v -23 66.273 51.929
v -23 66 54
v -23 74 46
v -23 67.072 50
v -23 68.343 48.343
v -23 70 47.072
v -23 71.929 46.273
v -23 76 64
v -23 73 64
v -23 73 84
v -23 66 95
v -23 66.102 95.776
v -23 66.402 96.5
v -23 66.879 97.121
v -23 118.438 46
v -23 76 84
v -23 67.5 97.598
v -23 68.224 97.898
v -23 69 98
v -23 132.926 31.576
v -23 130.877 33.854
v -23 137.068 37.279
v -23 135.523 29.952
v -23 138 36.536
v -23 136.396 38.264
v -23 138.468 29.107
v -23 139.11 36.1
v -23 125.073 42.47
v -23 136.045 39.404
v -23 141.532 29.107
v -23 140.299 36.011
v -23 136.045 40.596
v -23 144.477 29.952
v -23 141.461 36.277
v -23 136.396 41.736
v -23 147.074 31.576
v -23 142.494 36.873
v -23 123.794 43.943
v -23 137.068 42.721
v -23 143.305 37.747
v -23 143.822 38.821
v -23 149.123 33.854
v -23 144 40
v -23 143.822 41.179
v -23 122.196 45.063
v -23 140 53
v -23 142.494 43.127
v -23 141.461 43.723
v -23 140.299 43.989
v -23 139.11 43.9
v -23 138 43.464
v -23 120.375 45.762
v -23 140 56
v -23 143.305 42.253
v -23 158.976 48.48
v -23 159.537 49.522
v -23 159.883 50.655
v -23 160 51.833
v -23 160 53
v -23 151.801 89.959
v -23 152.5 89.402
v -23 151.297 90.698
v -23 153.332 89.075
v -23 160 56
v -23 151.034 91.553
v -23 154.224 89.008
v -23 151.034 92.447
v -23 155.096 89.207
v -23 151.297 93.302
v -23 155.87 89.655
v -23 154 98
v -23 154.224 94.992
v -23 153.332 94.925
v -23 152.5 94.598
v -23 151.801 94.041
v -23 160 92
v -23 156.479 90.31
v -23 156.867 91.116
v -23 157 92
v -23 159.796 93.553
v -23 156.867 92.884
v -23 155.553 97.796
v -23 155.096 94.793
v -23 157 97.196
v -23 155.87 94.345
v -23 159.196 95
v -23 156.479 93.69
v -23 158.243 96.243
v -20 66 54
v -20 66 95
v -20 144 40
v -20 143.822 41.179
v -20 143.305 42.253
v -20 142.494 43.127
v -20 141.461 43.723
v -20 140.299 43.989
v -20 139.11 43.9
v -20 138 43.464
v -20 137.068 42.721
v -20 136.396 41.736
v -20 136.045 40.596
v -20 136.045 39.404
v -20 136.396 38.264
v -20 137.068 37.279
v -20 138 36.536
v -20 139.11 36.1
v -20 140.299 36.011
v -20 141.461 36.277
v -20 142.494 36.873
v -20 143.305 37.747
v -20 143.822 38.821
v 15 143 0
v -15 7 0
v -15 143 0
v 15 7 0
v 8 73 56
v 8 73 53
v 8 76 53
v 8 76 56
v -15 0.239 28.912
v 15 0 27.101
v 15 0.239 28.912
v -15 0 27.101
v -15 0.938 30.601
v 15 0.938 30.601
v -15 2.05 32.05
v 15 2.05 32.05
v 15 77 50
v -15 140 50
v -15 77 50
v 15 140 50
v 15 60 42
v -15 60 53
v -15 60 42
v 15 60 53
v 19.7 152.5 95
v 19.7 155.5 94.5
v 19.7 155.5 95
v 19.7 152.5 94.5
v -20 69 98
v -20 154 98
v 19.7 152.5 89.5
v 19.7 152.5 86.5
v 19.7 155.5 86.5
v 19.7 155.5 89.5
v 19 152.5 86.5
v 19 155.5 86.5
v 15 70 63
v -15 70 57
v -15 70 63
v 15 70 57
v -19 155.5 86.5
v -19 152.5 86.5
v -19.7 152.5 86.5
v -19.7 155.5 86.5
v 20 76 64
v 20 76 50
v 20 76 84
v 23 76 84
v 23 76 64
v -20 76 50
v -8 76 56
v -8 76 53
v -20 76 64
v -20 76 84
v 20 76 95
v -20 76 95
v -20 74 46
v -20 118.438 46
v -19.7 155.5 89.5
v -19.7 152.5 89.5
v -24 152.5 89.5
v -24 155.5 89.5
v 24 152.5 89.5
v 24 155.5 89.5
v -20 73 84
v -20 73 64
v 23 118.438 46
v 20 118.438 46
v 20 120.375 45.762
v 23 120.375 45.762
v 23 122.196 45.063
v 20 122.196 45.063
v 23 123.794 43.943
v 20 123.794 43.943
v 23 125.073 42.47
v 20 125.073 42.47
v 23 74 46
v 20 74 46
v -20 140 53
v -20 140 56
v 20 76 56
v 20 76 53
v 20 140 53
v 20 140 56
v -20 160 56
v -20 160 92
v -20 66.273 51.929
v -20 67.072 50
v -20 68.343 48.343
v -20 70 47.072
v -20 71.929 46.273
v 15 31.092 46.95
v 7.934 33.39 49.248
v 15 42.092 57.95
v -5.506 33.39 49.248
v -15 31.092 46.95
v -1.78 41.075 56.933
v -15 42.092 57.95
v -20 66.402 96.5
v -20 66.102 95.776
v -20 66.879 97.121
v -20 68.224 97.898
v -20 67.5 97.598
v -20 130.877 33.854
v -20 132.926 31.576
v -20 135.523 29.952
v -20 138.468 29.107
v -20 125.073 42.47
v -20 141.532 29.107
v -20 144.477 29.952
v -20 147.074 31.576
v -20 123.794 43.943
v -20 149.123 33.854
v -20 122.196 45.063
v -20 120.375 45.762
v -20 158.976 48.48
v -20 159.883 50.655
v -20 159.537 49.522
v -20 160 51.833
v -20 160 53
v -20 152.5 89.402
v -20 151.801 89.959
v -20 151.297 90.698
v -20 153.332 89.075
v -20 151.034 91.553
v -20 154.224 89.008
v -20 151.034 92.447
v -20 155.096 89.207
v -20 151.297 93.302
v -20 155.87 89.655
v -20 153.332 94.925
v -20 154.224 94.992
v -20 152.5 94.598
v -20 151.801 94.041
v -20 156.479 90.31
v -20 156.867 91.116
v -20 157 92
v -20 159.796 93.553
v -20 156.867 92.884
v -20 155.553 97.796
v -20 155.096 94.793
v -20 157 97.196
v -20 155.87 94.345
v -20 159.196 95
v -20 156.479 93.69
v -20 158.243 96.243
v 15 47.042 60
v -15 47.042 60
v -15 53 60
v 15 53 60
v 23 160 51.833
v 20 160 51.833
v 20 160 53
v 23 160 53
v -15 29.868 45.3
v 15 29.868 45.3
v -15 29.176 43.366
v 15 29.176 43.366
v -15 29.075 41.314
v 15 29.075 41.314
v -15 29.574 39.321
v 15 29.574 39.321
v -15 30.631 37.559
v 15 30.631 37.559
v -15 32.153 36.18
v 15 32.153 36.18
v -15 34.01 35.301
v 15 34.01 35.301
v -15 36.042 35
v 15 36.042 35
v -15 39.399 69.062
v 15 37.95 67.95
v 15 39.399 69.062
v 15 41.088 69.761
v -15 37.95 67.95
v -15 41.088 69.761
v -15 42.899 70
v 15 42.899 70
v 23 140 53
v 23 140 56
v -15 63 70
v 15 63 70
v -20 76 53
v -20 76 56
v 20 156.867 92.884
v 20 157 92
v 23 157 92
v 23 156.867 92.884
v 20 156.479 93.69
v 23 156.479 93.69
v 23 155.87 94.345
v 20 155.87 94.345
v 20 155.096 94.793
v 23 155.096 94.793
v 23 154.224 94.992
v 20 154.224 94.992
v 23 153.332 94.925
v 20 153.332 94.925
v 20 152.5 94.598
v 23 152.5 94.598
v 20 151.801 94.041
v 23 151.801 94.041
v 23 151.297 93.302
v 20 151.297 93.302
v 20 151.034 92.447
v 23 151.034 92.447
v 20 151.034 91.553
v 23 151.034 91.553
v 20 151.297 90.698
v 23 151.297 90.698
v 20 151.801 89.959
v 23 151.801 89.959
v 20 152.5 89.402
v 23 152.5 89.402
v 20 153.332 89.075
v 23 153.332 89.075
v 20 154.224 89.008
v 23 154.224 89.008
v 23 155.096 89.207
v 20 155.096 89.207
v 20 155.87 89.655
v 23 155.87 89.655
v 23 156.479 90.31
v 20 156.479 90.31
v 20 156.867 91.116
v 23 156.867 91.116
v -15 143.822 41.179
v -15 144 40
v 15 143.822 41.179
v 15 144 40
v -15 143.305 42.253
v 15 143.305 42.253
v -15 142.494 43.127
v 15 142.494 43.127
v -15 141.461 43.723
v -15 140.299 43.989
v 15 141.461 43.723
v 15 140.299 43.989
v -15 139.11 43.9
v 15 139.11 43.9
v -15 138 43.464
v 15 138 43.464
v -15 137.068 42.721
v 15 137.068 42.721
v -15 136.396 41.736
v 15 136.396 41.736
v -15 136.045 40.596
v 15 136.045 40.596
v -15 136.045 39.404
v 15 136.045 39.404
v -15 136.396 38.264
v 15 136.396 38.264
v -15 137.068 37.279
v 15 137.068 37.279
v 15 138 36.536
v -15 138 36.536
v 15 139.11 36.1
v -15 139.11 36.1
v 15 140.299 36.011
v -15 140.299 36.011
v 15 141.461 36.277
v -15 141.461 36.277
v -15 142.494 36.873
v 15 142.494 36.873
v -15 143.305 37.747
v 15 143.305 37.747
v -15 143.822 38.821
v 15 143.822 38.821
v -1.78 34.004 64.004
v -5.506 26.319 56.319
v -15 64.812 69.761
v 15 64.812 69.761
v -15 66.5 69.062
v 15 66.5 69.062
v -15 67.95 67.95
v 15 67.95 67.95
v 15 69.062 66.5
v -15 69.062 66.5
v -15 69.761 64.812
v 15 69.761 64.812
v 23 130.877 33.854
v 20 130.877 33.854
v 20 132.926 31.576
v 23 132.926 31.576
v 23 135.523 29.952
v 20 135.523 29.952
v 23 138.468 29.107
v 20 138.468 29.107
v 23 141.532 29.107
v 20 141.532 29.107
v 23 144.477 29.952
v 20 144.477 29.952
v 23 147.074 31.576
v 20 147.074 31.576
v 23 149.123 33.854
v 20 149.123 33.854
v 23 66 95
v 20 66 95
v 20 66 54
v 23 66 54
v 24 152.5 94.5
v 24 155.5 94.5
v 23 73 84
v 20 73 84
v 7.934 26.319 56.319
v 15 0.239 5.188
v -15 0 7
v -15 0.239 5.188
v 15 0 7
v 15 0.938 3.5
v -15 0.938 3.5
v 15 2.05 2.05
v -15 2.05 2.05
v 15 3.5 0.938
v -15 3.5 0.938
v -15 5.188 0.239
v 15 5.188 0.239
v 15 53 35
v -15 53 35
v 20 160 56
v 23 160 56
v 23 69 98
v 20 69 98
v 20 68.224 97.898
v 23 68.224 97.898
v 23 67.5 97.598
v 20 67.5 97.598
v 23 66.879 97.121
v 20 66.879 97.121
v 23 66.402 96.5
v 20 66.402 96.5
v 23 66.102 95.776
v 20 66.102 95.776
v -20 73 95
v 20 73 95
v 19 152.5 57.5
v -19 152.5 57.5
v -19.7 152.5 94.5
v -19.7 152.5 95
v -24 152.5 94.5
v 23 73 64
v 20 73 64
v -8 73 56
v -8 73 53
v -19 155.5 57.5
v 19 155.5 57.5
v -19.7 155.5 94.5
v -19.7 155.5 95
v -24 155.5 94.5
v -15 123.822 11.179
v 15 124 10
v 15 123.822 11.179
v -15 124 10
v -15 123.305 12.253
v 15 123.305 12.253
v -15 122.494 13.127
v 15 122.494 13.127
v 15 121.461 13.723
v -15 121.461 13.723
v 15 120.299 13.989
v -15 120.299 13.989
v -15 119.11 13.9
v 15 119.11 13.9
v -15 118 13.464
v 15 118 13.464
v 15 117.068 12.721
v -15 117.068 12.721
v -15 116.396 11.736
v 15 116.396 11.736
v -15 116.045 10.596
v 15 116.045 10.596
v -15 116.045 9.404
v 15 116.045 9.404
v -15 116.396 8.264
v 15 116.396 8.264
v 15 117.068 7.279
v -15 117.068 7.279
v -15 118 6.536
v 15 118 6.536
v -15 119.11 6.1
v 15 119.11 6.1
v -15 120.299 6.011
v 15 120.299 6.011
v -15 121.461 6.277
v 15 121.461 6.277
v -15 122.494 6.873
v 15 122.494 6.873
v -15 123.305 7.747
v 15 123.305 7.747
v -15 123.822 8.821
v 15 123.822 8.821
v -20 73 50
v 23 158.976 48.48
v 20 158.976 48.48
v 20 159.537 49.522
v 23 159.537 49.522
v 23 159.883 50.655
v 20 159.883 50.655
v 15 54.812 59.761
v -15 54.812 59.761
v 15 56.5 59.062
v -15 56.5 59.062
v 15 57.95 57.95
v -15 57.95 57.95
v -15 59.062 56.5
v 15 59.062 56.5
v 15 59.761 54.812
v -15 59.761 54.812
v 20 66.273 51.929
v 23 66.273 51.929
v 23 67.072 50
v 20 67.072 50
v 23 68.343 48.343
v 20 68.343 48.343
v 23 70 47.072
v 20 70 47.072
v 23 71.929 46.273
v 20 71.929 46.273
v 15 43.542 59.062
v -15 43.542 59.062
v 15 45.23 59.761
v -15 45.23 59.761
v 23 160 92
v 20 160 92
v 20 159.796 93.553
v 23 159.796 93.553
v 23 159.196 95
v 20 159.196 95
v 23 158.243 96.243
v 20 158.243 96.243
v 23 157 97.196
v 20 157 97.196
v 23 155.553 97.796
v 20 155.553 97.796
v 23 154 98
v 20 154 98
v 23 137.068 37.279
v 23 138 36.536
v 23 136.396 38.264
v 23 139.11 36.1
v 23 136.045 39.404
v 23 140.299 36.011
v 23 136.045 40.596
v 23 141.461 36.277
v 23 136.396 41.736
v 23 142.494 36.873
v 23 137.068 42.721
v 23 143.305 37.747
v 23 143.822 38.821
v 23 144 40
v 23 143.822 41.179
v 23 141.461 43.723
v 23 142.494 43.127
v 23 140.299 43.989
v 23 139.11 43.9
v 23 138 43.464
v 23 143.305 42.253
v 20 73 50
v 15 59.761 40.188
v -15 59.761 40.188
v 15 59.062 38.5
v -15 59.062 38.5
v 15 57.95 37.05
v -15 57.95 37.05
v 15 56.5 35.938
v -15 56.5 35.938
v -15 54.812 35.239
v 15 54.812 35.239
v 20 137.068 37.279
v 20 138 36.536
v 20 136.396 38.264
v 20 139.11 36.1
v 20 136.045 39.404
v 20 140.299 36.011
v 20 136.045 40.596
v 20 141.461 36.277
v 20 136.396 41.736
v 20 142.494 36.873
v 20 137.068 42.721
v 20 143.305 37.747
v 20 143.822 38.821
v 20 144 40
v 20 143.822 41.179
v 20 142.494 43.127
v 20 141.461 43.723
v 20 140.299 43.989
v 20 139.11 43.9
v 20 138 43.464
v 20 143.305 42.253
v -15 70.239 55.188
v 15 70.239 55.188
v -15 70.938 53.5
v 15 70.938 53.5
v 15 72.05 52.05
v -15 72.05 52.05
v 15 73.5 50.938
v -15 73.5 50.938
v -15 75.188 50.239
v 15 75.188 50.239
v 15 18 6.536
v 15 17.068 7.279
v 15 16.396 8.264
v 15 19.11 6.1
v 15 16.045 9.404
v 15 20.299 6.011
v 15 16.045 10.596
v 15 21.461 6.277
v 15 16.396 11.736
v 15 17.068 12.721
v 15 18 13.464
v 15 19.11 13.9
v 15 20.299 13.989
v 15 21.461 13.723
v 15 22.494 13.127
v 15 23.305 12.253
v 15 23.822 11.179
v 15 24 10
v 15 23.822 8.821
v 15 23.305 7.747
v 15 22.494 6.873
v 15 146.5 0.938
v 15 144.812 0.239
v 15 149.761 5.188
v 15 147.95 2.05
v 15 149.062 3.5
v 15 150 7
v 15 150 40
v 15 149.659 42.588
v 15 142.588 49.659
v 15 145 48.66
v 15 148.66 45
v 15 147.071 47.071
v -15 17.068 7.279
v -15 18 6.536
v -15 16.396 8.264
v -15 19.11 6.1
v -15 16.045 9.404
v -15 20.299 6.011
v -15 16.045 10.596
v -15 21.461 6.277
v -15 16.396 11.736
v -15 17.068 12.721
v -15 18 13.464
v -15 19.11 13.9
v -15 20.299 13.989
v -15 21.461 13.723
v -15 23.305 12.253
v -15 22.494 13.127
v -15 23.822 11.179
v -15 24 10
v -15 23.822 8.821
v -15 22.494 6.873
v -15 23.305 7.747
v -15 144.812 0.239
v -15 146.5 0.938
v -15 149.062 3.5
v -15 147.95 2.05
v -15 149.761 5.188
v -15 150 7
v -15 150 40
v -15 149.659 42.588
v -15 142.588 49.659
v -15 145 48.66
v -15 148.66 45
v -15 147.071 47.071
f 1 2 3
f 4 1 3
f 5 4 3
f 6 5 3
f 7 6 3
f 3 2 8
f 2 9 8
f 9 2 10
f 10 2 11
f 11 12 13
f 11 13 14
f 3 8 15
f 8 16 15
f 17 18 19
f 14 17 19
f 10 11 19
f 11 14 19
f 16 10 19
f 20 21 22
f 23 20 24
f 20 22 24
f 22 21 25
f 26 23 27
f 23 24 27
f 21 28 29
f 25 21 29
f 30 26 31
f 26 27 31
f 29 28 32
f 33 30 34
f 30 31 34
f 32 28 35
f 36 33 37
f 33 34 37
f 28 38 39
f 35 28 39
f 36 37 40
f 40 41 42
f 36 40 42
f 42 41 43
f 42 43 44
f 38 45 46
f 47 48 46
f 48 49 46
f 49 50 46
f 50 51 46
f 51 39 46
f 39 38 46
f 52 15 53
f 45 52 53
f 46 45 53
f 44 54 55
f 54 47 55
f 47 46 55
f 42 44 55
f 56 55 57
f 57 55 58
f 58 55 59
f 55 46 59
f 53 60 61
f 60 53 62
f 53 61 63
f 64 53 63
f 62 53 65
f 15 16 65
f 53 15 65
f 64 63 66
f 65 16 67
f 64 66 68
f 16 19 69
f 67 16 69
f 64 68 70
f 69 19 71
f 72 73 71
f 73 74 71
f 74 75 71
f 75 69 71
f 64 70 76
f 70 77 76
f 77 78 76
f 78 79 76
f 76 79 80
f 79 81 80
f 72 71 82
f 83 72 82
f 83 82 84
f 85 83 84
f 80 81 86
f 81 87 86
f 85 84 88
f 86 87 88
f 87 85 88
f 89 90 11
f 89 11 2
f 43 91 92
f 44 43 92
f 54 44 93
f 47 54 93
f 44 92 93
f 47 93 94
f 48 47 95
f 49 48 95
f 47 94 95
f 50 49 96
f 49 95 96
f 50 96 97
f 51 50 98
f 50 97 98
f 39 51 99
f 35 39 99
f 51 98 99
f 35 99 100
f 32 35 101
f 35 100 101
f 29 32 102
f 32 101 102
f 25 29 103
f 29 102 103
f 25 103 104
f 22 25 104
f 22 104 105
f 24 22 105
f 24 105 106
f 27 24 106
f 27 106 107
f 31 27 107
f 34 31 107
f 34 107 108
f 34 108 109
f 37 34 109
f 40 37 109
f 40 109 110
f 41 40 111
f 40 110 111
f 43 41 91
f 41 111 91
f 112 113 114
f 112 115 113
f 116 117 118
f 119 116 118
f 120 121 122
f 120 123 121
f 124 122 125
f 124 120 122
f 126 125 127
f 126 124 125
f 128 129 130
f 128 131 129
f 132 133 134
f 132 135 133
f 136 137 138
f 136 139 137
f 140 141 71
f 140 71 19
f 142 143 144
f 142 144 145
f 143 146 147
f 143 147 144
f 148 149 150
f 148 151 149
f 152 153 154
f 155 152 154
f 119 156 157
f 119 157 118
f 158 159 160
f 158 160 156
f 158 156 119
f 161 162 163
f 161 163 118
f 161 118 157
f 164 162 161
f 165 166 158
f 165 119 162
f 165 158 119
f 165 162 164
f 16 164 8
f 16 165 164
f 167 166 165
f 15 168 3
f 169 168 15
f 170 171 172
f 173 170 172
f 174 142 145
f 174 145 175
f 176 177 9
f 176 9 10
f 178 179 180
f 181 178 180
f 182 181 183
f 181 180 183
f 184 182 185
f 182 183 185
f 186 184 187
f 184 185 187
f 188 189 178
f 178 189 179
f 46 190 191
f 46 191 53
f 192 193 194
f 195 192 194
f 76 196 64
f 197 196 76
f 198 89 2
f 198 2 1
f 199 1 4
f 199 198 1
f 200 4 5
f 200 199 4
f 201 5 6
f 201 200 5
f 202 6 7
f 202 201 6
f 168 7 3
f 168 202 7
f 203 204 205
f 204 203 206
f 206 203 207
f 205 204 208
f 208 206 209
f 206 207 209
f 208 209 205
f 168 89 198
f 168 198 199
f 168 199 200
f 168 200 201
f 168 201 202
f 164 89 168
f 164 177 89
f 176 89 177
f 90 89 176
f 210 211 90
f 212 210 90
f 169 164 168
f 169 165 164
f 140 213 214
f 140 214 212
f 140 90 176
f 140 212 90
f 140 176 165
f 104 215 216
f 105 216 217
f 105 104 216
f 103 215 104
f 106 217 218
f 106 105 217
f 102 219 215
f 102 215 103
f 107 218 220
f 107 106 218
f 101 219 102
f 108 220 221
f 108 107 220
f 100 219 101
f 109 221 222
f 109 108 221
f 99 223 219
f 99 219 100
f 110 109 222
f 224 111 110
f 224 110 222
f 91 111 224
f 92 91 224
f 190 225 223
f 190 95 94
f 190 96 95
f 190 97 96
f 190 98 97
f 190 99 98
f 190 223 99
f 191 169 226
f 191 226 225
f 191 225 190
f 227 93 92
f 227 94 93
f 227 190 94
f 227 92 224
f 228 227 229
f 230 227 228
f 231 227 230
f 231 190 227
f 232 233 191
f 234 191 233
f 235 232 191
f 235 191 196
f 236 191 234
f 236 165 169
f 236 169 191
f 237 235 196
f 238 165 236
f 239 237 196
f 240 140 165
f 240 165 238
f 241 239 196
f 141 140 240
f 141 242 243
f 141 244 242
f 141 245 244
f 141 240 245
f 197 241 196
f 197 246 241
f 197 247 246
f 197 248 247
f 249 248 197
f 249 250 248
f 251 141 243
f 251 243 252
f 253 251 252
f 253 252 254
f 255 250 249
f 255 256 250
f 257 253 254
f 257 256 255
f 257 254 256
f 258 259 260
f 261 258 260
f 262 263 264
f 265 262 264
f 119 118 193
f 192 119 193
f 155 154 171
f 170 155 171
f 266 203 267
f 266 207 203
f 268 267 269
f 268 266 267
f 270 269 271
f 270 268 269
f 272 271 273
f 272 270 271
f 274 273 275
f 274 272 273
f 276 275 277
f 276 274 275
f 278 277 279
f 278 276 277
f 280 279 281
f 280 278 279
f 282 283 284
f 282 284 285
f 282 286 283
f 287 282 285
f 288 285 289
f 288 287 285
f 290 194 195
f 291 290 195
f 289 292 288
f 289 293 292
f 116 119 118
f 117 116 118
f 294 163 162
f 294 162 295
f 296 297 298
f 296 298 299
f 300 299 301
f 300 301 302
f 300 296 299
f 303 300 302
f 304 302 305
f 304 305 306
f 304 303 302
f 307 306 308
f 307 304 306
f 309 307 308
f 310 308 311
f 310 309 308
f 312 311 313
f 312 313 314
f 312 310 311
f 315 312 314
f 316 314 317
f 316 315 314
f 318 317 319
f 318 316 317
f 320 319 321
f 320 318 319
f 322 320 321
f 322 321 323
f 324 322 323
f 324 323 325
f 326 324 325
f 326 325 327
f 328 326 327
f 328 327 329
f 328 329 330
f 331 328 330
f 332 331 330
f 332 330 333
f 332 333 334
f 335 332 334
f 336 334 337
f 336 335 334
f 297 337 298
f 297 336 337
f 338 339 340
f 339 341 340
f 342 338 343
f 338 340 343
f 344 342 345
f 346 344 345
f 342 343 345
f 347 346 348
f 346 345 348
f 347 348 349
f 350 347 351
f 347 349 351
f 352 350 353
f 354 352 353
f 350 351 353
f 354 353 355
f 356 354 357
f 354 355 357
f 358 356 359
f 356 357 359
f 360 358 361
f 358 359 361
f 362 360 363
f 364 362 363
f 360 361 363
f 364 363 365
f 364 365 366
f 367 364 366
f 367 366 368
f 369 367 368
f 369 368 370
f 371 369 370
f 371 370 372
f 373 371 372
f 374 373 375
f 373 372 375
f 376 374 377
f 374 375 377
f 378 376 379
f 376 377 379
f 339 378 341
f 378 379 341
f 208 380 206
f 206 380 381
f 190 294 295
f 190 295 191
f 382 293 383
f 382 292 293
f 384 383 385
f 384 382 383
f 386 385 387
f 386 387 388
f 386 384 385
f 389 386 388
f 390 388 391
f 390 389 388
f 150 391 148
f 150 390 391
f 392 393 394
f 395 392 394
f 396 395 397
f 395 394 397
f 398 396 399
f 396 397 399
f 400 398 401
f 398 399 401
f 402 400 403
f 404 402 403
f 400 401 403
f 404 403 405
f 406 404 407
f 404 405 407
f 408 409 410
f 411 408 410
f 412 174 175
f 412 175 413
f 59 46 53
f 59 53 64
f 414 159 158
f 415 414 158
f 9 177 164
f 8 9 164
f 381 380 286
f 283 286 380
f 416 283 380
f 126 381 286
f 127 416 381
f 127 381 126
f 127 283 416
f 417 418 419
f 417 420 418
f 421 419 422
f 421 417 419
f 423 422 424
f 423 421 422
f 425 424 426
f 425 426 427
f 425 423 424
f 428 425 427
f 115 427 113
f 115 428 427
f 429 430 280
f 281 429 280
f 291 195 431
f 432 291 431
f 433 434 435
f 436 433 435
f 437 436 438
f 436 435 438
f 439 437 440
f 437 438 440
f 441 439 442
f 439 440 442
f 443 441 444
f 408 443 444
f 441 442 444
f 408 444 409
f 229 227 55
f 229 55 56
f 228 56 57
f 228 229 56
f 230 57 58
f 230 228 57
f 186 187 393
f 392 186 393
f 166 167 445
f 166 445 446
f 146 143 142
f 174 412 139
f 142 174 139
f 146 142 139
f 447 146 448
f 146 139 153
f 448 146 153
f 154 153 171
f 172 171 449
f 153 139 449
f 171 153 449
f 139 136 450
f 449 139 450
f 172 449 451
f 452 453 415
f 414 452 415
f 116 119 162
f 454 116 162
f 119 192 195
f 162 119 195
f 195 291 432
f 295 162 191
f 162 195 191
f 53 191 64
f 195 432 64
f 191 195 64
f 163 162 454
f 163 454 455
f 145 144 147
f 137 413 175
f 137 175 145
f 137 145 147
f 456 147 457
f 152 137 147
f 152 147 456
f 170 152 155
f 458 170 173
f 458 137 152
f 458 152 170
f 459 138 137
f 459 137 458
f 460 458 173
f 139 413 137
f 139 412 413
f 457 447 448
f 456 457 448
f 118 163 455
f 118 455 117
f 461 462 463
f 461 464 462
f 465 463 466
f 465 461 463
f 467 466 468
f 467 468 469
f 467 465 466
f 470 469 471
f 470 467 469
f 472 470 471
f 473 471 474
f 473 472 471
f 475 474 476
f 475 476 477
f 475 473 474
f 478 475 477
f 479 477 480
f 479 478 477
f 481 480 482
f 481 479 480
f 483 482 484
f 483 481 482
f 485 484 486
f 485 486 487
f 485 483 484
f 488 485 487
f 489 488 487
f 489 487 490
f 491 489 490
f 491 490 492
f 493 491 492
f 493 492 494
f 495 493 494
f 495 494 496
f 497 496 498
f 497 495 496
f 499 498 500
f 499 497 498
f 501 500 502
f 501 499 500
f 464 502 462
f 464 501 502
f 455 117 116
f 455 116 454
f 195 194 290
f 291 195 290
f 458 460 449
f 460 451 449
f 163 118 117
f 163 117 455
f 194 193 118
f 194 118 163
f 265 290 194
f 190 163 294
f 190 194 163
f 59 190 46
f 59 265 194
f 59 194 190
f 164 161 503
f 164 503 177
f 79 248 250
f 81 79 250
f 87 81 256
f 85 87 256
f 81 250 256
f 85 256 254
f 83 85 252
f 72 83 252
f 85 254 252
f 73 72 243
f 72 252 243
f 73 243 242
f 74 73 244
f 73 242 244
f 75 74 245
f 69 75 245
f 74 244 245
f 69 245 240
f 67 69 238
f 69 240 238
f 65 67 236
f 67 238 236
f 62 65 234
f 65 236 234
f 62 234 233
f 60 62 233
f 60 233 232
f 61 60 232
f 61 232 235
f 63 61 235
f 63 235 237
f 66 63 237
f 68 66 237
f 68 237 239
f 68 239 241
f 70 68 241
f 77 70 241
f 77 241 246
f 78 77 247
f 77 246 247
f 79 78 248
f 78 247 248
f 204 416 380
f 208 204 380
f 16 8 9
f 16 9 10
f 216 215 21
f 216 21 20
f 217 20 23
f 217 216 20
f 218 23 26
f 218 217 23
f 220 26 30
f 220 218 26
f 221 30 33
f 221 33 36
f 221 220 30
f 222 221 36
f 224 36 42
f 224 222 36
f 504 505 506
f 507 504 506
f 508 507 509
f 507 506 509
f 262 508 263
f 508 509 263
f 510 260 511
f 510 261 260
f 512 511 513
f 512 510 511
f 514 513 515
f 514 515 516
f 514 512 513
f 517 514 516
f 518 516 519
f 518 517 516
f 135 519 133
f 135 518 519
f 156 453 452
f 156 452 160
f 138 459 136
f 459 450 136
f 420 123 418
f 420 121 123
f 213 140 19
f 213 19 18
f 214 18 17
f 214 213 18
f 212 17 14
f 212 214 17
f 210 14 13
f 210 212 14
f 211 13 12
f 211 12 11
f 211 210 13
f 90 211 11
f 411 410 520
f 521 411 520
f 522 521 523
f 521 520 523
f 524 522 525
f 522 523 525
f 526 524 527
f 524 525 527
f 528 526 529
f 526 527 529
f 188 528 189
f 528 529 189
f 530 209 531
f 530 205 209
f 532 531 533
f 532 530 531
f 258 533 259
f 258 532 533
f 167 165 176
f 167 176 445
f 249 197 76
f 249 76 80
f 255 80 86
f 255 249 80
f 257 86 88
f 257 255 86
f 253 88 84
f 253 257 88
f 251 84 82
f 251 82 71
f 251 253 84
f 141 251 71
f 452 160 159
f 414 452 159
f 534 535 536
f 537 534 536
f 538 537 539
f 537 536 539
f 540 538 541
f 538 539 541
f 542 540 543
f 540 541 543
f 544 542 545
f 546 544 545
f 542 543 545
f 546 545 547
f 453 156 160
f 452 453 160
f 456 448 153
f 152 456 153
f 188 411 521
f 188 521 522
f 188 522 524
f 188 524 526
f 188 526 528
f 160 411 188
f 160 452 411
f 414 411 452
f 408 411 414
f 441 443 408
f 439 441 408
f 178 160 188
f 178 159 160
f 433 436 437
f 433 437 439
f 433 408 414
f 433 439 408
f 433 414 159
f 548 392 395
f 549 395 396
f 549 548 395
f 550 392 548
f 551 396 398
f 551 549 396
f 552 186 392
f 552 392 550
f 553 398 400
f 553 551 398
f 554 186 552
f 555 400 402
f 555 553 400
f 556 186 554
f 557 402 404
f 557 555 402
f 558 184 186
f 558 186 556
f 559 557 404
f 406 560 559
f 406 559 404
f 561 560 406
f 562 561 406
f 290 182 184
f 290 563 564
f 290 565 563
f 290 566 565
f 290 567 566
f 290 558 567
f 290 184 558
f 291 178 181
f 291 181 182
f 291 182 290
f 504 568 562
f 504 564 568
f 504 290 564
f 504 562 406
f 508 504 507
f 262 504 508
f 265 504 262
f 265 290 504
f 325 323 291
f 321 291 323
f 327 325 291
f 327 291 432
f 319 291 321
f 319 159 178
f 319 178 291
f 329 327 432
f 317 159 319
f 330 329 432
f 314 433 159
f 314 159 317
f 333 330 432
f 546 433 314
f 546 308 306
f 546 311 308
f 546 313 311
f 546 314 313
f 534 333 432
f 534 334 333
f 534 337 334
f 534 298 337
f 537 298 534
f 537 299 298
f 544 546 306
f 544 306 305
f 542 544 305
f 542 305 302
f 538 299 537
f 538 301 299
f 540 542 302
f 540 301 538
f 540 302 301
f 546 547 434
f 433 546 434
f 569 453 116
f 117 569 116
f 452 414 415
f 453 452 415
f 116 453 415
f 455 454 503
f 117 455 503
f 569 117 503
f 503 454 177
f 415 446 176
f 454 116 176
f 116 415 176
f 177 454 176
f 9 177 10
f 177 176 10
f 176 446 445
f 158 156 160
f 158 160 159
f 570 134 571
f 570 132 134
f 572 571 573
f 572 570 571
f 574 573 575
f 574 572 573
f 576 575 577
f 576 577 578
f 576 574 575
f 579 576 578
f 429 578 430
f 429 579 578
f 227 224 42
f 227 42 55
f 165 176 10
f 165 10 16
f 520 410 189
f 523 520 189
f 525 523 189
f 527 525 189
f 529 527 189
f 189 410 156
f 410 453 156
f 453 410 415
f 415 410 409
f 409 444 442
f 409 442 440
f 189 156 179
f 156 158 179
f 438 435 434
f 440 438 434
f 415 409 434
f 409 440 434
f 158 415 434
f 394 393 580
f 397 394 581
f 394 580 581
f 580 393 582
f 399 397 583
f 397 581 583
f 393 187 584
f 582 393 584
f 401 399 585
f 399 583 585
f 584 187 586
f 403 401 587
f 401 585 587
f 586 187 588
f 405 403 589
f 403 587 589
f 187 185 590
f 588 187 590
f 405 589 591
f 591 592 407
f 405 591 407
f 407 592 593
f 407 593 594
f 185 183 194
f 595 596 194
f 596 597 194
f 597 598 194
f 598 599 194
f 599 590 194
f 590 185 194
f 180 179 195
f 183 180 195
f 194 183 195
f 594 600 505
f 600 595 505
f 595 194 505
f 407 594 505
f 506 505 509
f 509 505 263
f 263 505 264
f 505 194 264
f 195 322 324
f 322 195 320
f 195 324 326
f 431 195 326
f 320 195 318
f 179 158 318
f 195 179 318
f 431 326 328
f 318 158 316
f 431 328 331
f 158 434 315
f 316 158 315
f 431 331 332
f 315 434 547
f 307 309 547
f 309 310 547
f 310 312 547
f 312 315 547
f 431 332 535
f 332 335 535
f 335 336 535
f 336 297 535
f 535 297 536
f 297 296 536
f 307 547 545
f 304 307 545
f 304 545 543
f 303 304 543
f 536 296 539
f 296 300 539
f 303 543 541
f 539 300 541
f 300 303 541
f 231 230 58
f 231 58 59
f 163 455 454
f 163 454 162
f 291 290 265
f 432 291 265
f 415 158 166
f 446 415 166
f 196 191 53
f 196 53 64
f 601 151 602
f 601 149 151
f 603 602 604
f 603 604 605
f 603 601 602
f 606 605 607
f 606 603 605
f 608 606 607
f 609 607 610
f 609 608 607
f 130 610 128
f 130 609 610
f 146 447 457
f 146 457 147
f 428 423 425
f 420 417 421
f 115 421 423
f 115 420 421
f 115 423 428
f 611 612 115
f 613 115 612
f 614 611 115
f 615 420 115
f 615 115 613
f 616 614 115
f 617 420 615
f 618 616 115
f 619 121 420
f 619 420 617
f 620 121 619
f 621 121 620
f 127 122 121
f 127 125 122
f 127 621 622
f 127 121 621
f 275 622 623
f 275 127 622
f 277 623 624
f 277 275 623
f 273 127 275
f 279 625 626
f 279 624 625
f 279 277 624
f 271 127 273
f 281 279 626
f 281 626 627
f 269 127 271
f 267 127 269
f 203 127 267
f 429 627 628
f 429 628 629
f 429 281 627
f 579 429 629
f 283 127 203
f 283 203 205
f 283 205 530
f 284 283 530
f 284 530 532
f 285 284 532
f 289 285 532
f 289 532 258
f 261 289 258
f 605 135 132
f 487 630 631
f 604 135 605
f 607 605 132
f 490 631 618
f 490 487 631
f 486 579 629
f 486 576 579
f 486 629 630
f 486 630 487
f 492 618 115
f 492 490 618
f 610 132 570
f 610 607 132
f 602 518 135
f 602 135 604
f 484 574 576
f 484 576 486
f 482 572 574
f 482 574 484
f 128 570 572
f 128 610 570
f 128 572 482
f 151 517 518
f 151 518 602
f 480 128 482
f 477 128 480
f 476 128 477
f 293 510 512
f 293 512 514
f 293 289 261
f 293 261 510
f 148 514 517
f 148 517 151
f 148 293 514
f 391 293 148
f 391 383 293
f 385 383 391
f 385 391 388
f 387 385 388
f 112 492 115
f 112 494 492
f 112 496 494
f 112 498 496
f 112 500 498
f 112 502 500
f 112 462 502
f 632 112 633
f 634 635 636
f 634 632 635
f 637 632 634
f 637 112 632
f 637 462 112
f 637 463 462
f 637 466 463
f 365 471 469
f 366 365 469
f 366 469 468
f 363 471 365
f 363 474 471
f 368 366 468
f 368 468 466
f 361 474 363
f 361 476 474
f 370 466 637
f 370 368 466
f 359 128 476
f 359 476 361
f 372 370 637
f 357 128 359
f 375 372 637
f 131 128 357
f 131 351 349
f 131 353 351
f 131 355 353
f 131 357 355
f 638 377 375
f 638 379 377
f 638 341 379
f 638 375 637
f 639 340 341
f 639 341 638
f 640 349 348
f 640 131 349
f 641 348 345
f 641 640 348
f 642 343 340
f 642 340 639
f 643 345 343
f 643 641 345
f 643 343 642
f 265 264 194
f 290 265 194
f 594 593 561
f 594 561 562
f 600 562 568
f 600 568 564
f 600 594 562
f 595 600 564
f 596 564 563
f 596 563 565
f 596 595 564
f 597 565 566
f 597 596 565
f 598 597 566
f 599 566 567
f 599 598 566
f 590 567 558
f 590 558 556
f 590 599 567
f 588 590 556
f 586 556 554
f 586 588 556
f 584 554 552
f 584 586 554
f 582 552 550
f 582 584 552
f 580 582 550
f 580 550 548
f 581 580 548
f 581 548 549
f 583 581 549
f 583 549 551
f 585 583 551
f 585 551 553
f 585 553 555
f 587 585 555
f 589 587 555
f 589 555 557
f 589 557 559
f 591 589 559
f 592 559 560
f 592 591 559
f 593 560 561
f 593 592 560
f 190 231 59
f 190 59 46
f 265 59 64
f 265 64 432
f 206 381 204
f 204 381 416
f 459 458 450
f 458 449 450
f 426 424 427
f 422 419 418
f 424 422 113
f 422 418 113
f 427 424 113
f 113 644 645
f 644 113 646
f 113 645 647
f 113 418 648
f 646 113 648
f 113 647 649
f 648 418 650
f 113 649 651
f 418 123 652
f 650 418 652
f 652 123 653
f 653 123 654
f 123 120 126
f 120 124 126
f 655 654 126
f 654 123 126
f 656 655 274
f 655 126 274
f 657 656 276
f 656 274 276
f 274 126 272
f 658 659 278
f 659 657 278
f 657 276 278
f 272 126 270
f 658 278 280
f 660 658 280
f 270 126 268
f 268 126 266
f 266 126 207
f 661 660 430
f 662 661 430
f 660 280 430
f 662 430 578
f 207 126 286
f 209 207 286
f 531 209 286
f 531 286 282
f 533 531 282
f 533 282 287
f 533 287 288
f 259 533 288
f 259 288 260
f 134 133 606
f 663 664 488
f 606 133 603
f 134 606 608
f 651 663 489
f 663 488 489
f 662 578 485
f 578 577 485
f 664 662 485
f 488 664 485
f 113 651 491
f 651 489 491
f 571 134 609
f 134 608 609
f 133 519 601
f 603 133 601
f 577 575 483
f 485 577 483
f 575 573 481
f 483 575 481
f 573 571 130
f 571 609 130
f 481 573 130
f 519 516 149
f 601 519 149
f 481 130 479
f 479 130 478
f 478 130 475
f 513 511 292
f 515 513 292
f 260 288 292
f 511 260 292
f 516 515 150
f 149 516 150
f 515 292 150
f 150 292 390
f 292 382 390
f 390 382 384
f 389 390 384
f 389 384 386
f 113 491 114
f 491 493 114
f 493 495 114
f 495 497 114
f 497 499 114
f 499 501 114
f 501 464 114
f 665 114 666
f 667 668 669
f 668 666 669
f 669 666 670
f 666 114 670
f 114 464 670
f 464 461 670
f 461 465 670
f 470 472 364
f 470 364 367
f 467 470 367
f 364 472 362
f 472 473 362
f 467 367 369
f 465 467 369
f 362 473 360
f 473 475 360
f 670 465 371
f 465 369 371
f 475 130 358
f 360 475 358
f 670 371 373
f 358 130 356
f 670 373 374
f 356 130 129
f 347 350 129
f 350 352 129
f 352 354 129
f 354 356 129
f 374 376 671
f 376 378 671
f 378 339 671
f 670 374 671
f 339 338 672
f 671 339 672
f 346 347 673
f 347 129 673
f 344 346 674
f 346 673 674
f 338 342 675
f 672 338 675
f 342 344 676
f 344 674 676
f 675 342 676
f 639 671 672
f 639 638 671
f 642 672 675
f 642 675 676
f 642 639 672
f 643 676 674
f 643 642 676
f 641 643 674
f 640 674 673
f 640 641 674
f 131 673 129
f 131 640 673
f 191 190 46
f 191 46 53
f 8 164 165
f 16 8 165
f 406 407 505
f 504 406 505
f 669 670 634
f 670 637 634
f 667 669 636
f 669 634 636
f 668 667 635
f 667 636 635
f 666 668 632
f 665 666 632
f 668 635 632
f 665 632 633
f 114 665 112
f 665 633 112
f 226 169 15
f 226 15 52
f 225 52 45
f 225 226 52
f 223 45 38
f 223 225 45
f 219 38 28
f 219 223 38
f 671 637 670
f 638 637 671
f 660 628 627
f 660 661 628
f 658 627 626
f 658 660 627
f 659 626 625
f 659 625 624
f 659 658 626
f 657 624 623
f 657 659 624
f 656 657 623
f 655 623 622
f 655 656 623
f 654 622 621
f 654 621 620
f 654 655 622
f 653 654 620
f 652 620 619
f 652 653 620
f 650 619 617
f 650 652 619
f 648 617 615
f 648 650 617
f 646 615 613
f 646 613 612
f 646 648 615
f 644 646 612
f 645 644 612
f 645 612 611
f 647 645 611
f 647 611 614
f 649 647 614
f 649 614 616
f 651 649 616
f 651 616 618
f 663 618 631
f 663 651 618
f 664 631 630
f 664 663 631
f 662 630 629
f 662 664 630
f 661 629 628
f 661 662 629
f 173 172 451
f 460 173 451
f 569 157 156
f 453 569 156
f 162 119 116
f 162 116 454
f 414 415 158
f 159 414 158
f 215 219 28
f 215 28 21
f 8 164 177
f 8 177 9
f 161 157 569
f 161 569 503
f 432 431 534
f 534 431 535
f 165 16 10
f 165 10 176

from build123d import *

# Parameters (mm, degrees)
F0_R      = 4
F1_DEPTH  = 15
F2_R      = 7
F4_DEPTH  = 10
F5_R      = 10
F6_R      = 4
F7_DEPTH  = 55.49347
F9_R      = 4
F9_W      = 3
F9_H      = 20
F9_R_2    = 3
F10_DEPTH = 3
F13_DEPTH = 3
F16_DEPTH = 3
F20_DEPTH = 1.5


with BuildPart() as f1:
    # F0 (on Right) → F1 (new body, symmetric)
    with BuildSketch(Plane.YZ):
        Polygon((0, 30), (0, 0), (150, 0), (150, 50), (70, 50), (70, 70), (40, 70), align=None)
        with Locations((20, 10)):
            Circle(F0_R, mode=Mode.SUBTRACT)
        with Locations((120, 10)):
            Circle(F0_R, mode=Mode.SUBTRACT)
        Polygon((19.1421356237, 35), (44.1421356237, 60), (60, 60), (60, 35), align=None, mode=Mode.SUBTRACT)
    extrude(amount=F1_DEPTH, both=True)

    # F2
    f2_edges = [f1.edges().sort_by_distance(p)[0] for p in [
        (0, 40, 70),
        (0, 70, 70),
        (0, 0, 30),
        (0, 0, 0),
        (0, 150, 0),
        (0, 60, 35),
        (0, 44.142136, 60),
        (0, 19.142136, 35),
        (0, 60, 60),
        (0, 70, 50),
    ]]
    fillet(f2_edges, radius=F2_R)

    # F3 (on face) → F4 (cut, through all)
    with BuildSketch(Plane(origin=(0, -15, 15), x_dir=(1, 0, 0), z_dir=(0, -0.7071067812, 0.7071067812))):
        Polygon((7.9343309626, 58.4344230592), (-1.7800361384, 69.3023130298), (-5.5058463477, 58.4344230592), align=None)
    extrude(amount=-F4_DEPTH, mode=Mode.SUBTRACT)

    # F5
    f5_edges = [f1.edges().sort_by_distance(p)[0] for p in [
        (0, 150, 50),
    ]]
    fillet(f5_edges, radius=F5_R)

    # F6 (on Right) → F7 (cut, symmetric)
    with BuildSketch(Plane.YZ):
        with Locations((140, 40)):
            Circle(F6_R)
    extrude(amount=F7_DEPTH, both=True, mode=Mode.SUBTRACT)


with BuildPart() as f10:
    # F9 (on offset) → F10 (new body)
    with BuildSketch(Plane.YZ.offset(20)):
        with BuildLine():
            Line((154, 98), (69, 98))
            ThreePointArc((69, 98), (66.8786796564, 97.1213203436), (66, 95))
            Line((66, 95), (66, 54))
            ThreePointArc((66, 54), (68.3431457505, 48.3431457505), (74, 46))
            Line((74, 46), (118.4380730854, 46))
            ThreePointArc((118.4380730854, 46), (122.1958728955, 45.062502431), (125.0729406588, 42.4697351469))
            Line((125.0729406588, 42.4697351469), (130.8770570865, 33.8541141731))
            ThreePointArc((130.8770570865, 33.8541141731), (140, 29), (149.1229429135, 33.8541141731))
            Line((149.1229429135, 33.8541141731), (158.9761506801, 48.4801997367))
            ThreePointArc((158.9761506801, 48.4801997367), (159.7383318168, 50.0799178721), (160, 51.8325010969))
            Line((160, 51.8325010969), (160, 53))
            Line((160, 53), (140, 53))
            Line((140, 53), (140, 56))
            Line((140, 56), (160, 56))
            Line((160, 56), (160, 92))
            ThreePointArc((160, 92), (158.2426406871, 96.2426406871), (154, 98))
        make_face()
        with Locations((140, 40)):
            Circle(F9_R, mode=Mode.SUBTRACT)
        with Locations((74.5, 74)):
            Rectangle(F9_W, F9_H, mode=Mode.SUBTRACT)
        with Locations((154, 92)):
            Circle(F9_R_2, mode=Mode.SUBTRACT)
    extrude(amount=F10_DEPTH)


with BuildPart() as f11_1:
    # F11: instance of F10
    add(f10.part.mirror(Plane.YZ))


with BuildPart() as f13:
    # F12 (on face) → F13 (new body)
    with BuildSketch(Plane.XY.offset(53)):
        Polygon((8, 76), (20, 76), (20, 140), (23, 140), (23, 160), (20, 160), (0, 160), (0, 76), (0, 73), (8, 73), align=None)
    extrude(amount=F13_DEPTH)

    # F14: F13 across face


with BuildPart() as f13_1:
    add(f13.part)
    add(f13.part.mirror(Plane(origin=(0, 116.5, 54.5), x_dir=(0, -1, 0), z_dir=(-1, 0, 0))))


with BuildPart() as f16:
    # F15 (on face) → F16 (new body)
    with BuildSketch(Plane.XZ.offset(-76)):
        Polygon((20, 50), (20, 64), (23, 64), (23, 84), (20, 84), (20, 95), (0, 95), (0, 56), (8, 56), (8, 53), (0, 53), (0, 50), align=None)
    extrude(amount=F16_DEPTH)

    # F17: F16 across face


with BuildPart() as f16_1:
    add(f16.part)
    add(f16.part.mirror(Plane(origin=(0, 74.5, 75.5), x_dir=(0, -1, 0), z_dir=(-1, 0, 0))))


with BuildPart() as f20:
    # F19 (on plane+point) → F20 (new body, symmetric)
    with BuildSketch(Plane.XZ.offset(-154)):
        Polygon((19.7, 95), (0, 95), (0, 57.5), (19, 57.5), (19, 86.5), (19.7, 86.5), (19.7, 89.5), (24, 89.5), (24, 94.5), (19.7, 94.5), align=None)
    extrude(amount=F20_DEPTH, both=True)

    # F21: F20 across face


with BuildPart() as f20_1:
    add(f20.part)
    add(f20.part.mirror(Plane(origin=(0, 154, 76.25), x_dir=(0, -1, 0), z_dir=(-1, 0, 0))))


solid = Compound([f1.part, f10.part, f11_1.part, f13_1.part, f16_1.part, f20_1.part])
